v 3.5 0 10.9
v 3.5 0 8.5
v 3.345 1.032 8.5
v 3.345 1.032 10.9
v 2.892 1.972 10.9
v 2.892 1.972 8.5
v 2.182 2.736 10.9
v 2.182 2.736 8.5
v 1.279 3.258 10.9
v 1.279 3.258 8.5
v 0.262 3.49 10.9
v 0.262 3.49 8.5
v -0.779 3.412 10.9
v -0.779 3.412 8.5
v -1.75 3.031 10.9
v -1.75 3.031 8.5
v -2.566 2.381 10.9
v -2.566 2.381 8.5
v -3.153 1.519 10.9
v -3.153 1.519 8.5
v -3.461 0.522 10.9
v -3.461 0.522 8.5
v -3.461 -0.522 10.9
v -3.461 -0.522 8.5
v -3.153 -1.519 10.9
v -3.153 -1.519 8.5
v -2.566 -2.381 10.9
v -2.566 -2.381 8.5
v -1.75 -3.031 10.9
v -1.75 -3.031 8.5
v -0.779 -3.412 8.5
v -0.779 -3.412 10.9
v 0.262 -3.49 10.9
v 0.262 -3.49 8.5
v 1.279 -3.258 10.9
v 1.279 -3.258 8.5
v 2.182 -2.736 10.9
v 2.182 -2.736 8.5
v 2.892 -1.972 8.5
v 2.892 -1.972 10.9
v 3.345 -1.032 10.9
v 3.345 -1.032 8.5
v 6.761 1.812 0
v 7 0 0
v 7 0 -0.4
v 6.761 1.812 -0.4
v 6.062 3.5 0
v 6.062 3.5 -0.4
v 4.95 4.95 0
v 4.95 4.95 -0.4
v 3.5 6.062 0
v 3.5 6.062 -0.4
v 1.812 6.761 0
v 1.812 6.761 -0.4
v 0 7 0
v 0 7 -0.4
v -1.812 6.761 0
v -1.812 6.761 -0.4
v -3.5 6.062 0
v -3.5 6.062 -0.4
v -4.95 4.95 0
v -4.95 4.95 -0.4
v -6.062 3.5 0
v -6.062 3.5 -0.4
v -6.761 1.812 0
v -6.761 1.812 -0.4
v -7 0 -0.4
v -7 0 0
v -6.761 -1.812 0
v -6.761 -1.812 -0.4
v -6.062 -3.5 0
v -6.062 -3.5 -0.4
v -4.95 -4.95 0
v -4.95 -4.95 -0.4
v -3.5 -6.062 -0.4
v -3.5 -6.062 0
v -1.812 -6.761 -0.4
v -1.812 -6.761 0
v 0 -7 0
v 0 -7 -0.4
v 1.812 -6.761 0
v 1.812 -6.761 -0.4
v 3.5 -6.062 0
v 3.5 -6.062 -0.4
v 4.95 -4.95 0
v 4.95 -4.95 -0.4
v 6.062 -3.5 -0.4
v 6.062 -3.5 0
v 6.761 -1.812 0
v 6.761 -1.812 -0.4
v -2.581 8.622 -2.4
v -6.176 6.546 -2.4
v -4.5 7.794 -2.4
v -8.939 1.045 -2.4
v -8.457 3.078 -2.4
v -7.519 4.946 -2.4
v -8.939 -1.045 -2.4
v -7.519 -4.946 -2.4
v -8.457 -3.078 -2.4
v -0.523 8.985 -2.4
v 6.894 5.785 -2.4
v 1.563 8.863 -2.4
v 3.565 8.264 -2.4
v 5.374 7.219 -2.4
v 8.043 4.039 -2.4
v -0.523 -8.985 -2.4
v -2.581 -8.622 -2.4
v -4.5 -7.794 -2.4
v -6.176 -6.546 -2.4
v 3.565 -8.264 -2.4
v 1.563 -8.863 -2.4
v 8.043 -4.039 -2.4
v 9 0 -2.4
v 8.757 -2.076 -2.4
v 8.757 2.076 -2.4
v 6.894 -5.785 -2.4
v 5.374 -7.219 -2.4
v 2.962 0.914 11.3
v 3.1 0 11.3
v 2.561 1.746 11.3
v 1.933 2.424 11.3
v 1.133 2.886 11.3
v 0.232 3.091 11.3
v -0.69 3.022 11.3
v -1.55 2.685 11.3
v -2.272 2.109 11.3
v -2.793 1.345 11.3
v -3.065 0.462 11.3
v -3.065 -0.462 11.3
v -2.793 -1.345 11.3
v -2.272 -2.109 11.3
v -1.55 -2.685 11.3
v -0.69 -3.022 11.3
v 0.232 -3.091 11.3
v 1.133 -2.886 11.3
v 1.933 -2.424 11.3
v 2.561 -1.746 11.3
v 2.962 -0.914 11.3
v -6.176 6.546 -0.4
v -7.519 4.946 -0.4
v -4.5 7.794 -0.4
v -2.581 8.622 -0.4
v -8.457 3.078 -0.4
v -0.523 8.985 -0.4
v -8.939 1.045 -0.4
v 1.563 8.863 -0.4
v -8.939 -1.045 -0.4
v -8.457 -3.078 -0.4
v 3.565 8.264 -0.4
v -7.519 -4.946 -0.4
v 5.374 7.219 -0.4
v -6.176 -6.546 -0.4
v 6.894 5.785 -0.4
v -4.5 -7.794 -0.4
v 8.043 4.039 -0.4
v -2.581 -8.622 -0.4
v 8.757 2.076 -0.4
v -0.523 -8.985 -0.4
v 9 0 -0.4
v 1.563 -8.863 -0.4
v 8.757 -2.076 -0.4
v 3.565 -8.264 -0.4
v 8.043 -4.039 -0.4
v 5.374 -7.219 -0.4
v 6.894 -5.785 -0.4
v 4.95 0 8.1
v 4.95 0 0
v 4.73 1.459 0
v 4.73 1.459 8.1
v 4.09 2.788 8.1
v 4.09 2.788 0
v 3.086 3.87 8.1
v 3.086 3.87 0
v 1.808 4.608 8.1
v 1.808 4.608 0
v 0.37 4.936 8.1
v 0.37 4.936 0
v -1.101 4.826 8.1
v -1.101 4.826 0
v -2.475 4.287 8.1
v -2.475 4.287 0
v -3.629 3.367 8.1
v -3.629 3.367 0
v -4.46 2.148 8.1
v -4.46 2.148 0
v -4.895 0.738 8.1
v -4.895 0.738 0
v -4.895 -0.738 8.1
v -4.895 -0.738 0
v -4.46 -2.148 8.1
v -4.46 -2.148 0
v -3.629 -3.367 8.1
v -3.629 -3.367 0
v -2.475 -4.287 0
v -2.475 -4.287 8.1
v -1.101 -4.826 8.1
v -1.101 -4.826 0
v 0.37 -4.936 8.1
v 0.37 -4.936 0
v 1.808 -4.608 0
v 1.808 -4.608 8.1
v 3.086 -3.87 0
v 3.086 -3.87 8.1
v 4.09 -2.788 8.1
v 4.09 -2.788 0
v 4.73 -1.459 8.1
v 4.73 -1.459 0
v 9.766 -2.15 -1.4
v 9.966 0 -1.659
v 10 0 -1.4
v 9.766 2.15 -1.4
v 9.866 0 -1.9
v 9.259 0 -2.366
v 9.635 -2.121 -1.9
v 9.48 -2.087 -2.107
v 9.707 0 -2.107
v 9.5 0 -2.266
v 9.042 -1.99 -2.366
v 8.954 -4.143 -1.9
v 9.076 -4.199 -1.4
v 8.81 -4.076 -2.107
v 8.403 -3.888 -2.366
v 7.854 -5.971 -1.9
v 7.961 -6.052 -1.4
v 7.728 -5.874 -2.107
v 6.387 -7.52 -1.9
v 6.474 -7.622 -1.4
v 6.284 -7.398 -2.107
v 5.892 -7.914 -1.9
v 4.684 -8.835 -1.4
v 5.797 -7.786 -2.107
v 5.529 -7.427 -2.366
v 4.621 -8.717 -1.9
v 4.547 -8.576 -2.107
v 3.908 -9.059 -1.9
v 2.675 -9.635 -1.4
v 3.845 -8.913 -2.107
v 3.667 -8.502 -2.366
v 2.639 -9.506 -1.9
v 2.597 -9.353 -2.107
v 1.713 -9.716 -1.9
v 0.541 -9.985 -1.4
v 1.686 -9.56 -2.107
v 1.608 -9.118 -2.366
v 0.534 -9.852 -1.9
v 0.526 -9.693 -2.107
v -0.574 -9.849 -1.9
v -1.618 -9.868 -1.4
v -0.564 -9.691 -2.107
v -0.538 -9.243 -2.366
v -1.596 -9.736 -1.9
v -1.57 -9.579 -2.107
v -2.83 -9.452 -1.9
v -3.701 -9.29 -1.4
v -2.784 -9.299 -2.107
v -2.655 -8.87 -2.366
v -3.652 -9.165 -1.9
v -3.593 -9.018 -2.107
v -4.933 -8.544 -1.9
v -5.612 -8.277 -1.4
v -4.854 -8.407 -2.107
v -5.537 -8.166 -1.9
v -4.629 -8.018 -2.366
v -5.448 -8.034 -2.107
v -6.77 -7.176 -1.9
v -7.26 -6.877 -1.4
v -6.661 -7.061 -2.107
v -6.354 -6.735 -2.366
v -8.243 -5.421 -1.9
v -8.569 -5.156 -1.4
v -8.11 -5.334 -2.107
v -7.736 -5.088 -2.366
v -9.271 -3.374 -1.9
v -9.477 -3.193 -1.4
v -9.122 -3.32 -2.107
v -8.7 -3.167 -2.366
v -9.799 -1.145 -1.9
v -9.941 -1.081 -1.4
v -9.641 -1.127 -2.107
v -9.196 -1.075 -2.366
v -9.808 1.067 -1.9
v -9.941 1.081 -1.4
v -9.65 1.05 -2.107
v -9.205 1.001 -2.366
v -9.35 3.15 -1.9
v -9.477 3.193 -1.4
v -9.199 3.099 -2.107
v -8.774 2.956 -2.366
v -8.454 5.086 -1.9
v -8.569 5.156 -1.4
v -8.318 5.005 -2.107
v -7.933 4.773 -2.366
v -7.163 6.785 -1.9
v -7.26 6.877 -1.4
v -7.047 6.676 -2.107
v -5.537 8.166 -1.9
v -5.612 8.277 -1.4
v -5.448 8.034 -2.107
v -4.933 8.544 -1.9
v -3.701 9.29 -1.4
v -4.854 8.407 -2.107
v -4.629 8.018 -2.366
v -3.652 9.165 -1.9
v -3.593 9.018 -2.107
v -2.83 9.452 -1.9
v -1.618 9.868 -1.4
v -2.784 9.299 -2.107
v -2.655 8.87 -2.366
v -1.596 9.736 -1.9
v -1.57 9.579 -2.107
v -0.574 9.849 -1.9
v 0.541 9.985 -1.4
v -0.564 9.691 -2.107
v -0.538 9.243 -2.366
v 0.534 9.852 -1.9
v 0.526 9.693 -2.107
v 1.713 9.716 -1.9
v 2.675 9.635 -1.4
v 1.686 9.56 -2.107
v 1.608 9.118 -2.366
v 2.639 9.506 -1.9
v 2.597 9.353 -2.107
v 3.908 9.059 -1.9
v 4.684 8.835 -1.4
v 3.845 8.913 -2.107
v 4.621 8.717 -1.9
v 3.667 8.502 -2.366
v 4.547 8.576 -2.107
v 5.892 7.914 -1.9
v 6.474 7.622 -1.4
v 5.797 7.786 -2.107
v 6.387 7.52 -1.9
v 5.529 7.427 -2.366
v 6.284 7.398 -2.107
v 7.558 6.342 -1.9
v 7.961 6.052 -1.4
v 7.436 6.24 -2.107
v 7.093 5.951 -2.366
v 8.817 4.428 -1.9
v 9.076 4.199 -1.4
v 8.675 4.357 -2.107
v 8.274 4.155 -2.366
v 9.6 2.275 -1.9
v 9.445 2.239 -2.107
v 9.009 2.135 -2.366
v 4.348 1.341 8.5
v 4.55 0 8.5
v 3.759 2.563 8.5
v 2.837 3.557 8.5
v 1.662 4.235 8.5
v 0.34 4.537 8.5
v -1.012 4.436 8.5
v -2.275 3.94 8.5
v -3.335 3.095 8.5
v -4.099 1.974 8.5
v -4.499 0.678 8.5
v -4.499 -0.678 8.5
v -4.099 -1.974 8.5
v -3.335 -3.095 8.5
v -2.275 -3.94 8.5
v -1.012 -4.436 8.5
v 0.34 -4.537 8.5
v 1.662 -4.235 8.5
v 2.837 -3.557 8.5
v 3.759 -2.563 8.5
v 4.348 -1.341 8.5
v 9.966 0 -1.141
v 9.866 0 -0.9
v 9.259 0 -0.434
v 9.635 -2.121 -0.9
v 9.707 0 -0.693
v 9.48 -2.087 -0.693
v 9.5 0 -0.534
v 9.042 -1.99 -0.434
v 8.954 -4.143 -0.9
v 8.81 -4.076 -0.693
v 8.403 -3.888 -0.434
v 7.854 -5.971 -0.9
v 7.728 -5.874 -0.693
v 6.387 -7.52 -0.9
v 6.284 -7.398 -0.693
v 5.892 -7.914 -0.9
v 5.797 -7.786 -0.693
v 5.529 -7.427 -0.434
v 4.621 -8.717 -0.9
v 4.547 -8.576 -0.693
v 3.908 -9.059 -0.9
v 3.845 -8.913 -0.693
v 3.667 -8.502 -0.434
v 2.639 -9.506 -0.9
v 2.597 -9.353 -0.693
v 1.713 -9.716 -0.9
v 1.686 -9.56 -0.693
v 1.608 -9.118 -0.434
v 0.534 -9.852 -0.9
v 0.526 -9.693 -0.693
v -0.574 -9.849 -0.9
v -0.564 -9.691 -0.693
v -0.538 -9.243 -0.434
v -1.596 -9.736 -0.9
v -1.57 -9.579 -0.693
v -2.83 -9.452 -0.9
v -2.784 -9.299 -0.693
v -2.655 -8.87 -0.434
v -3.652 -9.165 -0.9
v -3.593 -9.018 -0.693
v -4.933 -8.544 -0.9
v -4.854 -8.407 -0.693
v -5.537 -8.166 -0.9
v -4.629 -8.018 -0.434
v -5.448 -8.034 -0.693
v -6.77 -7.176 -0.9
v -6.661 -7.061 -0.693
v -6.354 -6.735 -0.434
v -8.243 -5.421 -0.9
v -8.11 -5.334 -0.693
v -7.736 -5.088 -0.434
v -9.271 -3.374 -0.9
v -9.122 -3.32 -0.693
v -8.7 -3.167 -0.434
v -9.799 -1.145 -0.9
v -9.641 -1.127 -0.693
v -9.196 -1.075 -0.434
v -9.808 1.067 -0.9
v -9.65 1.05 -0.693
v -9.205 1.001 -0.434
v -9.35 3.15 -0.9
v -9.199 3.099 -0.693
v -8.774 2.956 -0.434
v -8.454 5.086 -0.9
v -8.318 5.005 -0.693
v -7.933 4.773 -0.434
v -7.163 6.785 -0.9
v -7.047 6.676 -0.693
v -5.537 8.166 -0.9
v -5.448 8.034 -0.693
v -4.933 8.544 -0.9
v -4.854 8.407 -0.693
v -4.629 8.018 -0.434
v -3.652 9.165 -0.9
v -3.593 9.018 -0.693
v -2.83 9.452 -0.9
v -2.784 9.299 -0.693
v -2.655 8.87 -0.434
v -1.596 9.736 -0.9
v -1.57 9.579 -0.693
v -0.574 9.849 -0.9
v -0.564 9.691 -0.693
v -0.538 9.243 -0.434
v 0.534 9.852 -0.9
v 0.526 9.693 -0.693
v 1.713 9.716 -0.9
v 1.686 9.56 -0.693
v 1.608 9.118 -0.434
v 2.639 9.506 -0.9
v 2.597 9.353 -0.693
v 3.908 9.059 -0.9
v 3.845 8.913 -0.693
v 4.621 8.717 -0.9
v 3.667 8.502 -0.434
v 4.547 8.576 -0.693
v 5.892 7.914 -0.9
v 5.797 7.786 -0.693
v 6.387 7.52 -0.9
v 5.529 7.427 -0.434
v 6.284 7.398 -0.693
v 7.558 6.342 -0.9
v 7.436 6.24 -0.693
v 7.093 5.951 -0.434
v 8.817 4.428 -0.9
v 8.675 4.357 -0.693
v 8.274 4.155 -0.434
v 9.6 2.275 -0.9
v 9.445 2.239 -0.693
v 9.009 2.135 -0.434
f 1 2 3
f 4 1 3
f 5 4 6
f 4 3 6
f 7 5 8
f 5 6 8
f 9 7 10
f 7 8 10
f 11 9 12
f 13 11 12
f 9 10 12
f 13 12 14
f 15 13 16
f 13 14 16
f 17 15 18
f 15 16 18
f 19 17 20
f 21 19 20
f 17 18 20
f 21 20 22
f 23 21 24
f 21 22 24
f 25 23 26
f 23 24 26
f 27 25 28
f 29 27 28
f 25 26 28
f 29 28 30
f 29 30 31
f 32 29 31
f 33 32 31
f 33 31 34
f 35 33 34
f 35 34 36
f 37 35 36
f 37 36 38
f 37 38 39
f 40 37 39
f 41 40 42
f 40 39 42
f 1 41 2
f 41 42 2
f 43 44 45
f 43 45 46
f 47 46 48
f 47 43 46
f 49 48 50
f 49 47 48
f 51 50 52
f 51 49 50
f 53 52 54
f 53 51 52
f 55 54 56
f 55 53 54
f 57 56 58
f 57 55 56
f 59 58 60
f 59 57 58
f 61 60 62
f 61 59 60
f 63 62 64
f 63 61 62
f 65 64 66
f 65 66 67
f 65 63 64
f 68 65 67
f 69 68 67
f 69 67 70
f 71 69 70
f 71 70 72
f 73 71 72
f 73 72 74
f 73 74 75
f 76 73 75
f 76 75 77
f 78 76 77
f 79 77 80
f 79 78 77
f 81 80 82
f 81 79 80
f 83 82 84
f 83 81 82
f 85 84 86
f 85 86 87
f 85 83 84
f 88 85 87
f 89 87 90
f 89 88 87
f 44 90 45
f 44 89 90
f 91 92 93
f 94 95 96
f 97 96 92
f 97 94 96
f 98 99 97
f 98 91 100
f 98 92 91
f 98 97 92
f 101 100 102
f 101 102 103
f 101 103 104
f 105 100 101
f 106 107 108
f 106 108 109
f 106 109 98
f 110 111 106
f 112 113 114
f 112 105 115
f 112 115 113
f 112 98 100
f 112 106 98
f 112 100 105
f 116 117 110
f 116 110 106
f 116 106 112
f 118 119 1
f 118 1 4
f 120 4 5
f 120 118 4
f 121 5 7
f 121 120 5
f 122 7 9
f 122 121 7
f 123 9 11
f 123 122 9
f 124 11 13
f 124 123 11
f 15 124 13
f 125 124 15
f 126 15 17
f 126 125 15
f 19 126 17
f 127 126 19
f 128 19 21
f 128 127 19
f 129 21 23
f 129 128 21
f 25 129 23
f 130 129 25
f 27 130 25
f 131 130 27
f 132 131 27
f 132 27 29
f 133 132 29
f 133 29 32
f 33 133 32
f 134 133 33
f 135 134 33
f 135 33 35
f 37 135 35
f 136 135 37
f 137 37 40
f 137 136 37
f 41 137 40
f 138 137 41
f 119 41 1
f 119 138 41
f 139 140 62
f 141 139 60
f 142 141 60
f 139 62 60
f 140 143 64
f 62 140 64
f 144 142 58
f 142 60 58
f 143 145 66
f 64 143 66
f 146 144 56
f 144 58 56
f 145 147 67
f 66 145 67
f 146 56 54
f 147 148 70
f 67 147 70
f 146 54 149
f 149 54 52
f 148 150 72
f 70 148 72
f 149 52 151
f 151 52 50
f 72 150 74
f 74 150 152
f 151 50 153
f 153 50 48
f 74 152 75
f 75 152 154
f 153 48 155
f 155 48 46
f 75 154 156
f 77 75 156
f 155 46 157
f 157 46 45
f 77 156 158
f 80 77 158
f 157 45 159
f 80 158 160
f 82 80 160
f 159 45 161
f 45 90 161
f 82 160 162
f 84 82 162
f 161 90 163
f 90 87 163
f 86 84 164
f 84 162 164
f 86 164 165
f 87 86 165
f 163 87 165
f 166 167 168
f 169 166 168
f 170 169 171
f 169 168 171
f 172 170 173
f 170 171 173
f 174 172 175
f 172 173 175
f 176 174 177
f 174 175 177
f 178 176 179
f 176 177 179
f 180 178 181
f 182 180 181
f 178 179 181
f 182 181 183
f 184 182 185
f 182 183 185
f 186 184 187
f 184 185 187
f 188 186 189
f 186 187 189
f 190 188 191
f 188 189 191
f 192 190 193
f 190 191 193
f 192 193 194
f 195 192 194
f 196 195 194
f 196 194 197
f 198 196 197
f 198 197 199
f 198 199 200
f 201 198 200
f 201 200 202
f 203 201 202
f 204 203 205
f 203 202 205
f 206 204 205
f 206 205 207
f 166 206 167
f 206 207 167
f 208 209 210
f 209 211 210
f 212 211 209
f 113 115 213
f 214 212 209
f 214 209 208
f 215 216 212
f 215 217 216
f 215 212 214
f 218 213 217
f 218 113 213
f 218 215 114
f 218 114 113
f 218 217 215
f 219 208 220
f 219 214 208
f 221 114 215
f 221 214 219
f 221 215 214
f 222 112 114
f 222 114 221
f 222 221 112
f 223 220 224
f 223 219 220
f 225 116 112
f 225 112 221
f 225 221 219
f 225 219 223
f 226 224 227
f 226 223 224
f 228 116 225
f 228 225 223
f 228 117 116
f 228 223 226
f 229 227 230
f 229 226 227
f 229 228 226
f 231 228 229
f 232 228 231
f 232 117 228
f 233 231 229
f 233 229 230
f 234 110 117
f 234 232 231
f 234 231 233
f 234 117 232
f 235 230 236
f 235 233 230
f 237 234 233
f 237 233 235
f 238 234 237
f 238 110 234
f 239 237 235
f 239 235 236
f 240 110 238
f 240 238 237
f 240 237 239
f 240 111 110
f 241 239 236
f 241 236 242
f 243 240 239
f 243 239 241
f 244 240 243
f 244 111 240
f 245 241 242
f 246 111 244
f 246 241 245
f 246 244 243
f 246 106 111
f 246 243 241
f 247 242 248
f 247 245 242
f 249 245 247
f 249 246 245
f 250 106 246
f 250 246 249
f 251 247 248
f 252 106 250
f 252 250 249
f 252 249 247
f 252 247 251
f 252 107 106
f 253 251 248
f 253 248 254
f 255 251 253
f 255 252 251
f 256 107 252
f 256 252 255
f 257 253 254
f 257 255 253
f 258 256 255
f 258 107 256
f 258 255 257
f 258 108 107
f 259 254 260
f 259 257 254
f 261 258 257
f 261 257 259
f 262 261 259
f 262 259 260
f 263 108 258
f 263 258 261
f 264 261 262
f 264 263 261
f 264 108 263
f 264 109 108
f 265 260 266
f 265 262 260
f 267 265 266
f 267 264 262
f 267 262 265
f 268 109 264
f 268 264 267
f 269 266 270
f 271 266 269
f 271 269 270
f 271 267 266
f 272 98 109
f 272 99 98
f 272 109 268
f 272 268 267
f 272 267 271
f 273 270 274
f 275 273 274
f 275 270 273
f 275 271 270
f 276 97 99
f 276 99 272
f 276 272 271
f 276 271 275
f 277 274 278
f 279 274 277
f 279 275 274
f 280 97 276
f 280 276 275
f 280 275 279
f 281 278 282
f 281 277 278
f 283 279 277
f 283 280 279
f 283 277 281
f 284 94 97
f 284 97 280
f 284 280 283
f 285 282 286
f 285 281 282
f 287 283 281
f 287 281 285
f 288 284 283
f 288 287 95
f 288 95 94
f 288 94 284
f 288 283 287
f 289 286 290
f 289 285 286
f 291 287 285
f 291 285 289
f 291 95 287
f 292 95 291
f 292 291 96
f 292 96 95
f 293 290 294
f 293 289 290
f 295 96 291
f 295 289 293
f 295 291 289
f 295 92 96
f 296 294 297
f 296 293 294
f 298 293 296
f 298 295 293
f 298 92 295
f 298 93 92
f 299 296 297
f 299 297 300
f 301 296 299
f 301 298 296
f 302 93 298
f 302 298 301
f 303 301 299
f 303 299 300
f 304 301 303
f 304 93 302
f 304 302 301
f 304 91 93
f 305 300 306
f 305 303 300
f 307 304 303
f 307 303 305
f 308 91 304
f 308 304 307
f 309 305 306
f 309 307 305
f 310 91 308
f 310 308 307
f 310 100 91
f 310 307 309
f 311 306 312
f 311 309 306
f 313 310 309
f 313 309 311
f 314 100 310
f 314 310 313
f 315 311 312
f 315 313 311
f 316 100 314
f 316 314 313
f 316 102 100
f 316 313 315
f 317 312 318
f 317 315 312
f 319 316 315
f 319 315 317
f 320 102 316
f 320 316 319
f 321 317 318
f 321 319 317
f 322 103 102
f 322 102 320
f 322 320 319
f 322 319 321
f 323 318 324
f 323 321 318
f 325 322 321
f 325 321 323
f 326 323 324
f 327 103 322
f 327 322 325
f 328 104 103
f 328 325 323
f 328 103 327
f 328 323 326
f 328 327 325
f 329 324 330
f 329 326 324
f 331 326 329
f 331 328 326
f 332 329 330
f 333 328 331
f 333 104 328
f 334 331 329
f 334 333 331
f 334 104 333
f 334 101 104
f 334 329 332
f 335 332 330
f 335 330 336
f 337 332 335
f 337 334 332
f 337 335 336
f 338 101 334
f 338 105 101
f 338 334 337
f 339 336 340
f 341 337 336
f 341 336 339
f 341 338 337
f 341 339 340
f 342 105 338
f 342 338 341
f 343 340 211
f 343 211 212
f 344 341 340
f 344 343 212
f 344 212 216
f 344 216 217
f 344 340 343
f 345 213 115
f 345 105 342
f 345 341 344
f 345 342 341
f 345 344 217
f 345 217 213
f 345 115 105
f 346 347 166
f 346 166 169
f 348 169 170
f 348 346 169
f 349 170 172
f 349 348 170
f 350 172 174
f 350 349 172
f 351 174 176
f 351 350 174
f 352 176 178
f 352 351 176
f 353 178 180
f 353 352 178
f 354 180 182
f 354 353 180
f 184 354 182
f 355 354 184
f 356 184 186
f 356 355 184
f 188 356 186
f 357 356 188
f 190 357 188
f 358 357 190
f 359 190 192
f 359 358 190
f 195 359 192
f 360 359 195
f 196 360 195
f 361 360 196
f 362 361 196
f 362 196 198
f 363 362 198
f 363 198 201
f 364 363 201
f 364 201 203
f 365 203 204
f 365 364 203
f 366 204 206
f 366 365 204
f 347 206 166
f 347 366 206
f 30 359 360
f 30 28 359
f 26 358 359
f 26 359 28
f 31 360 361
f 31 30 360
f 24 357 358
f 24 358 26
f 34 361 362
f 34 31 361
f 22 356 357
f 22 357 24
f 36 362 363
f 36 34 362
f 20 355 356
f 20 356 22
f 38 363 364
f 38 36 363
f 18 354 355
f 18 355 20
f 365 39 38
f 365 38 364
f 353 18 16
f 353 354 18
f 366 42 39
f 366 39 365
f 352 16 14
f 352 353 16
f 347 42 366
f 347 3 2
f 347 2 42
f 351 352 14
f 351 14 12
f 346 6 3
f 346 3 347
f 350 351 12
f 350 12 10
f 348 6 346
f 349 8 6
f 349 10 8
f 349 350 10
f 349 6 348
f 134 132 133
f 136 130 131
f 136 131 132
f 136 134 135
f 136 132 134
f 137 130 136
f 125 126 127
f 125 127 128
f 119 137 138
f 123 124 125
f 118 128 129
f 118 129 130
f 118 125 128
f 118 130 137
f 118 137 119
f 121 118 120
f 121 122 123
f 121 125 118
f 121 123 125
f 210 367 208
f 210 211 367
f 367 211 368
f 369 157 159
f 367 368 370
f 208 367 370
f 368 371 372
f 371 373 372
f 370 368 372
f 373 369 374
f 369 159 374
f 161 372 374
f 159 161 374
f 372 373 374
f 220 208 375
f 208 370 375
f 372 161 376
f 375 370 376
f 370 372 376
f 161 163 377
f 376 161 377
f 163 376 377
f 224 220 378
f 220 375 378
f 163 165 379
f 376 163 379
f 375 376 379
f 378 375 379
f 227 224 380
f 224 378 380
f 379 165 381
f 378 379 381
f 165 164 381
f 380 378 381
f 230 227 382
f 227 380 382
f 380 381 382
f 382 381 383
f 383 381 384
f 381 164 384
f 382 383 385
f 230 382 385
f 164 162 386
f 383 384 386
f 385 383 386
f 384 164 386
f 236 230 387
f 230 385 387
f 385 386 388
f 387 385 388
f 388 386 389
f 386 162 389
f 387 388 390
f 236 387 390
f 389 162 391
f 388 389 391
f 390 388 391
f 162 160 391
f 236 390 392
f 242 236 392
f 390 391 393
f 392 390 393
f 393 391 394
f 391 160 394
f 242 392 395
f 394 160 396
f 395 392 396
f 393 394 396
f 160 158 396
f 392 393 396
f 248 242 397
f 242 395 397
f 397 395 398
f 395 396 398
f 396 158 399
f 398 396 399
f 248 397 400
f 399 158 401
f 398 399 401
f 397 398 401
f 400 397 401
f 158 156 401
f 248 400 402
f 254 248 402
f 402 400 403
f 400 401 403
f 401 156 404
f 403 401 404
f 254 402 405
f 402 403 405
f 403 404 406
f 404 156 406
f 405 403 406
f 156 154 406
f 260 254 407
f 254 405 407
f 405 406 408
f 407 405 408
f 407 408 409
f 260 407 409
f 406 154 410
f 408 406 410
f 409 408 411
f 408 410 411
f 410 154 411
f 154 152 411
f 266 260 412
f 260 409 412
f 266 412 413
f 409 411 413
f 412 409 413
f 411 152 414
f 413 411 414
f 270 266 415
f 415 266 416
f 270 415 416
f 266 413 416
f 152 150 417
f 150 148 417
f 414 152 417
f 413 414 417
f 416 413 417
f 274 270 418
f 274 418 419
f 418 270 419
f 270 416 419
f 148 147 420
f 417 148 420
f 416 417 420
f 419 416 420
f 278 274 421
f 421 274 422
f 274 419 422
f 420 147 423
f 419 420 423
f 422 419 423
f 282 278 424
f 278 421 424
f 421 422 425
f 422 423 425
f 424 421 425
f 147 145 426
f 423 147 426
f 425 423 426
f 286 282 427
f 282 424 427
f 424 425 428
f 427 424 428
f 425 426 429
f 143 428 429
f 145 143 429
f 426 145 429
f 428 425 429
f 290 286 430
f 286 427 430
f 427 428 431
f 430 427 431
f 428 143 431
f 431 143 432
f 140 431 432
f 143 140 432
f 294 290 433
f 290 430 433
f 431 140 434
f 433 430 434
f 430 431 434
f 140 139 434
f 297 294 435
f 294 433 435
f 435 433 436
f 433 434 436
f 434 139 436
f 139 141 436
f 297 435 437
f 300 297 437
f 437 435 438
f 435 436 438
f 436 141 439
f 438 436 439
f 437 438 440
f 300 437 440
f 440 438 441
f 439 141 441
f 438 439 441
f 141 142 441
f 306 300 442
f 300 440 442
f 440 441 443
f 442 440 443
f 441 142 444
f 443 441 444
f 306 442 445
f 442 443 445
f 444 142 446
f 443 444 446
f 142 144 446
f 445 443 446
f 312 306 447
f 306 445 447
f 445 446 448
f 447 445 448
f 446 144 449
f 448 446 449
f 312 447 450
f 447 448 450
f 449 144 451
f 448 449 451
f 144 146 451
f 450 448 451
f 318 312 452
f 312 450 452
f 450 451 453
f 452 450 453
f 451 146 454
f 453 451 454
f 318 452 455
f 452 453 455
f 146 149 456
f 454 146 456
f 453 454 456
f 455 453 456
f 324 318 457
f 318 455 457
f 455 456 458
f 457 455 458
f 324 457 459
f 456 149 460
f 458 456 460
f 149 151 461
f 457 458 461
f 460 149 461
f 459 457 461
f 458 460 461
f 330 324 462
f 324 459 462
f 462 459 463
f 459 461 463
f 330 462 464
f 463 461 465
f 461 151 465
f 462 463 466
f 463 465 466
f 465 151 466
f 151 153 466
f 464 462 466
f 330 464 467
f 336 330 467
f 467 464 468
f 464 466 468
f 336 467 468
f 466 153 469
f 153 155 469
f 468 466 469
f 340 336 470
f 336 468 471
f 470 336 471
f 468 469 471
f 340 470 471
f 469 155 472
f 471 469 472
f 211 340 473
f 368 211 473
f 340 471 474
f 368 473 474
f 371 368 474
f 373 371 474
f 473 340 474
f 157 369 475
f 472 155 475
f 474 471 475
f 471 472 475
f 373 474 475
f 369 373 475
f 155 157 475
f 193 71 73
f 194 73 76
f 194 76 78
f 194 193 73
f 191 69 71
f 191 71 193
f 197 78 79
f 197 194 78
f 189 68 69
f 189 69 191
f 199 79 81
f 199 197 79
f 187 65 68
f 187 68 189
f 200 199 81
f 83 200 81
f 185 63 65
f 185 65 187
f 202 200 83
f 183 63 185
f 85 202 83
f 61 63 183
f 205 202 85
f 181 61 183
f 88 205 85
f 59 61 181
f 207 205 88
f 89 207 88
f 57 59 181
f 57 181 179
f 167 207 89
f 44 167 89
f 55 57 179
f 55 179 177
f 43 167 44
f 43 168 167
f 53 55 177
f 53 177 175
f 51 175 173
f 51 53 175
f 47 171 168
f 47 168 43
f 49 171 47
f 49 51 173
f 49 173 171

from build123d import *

# Parameters (mm, degrees)
F0_R     = 4.95
F1_DEPTH = 8.5
F2_R     = 7
F3_DEPTH = 0.4
F4_R     = 10
F5_DEPTH = 2
F6_R     = 0.99999
F7_R     = 3.5
F8_DEPTH = 2.8
F9_SIZE  = 0.4


# Not quite as in the source:
# - a fillet or chamfer is up to 0.001 mm smaller than in the source, because OpenCascade refuses the exact size


with BuildPart() as f1:
    # F0 (on Top) → F1 (new body)
    with BuildSketch(Plane.XY):
        Circle(F0_R)
    extrude(amount=F1_DEPTH)

    # F2 (on Top) → F3 (join)
    with BuildSketch(Plane.XY):
        Circle(F2_R)
    extrude(amount=-F3_DEPTH)

    # F4 (on face) → F5 (join)
    with BuildSketch(Plane(origin=(0, 0, -0.4), x_dir=(1, 0, 0), z_dir=(0, 0, -1))):
        Circle(F4_R)
    extrude(amount=F5_DEPTH)

    # F6 (radius 1 in the source; OpenCascade refuses exactly that, so slightly less here)
    f6_edges = [f1.edges().sort_by_distance(p)[0] for p in [
        (-10, 0, -2.4),
        (-10, 0, -0.4),
    ]]
    fillet(f6_edges, radius=F6_R)

    # F7 (on face) → F8 (join)
    with BuildSketch(Plane.XY.offset(8.5)):
        Circle(F7_R)
    extrude(amount=F8_DEPTH)

    # F9
    f9_edges = [f1.edges().sort_by_distance(p)[0] for p in [
        (-3.5, 0, 11.3),
        (-4.95, 0, 8.5),
    ]]
    chamfer(f9_edges, length=F9_SIZE)


solid = f1.part
